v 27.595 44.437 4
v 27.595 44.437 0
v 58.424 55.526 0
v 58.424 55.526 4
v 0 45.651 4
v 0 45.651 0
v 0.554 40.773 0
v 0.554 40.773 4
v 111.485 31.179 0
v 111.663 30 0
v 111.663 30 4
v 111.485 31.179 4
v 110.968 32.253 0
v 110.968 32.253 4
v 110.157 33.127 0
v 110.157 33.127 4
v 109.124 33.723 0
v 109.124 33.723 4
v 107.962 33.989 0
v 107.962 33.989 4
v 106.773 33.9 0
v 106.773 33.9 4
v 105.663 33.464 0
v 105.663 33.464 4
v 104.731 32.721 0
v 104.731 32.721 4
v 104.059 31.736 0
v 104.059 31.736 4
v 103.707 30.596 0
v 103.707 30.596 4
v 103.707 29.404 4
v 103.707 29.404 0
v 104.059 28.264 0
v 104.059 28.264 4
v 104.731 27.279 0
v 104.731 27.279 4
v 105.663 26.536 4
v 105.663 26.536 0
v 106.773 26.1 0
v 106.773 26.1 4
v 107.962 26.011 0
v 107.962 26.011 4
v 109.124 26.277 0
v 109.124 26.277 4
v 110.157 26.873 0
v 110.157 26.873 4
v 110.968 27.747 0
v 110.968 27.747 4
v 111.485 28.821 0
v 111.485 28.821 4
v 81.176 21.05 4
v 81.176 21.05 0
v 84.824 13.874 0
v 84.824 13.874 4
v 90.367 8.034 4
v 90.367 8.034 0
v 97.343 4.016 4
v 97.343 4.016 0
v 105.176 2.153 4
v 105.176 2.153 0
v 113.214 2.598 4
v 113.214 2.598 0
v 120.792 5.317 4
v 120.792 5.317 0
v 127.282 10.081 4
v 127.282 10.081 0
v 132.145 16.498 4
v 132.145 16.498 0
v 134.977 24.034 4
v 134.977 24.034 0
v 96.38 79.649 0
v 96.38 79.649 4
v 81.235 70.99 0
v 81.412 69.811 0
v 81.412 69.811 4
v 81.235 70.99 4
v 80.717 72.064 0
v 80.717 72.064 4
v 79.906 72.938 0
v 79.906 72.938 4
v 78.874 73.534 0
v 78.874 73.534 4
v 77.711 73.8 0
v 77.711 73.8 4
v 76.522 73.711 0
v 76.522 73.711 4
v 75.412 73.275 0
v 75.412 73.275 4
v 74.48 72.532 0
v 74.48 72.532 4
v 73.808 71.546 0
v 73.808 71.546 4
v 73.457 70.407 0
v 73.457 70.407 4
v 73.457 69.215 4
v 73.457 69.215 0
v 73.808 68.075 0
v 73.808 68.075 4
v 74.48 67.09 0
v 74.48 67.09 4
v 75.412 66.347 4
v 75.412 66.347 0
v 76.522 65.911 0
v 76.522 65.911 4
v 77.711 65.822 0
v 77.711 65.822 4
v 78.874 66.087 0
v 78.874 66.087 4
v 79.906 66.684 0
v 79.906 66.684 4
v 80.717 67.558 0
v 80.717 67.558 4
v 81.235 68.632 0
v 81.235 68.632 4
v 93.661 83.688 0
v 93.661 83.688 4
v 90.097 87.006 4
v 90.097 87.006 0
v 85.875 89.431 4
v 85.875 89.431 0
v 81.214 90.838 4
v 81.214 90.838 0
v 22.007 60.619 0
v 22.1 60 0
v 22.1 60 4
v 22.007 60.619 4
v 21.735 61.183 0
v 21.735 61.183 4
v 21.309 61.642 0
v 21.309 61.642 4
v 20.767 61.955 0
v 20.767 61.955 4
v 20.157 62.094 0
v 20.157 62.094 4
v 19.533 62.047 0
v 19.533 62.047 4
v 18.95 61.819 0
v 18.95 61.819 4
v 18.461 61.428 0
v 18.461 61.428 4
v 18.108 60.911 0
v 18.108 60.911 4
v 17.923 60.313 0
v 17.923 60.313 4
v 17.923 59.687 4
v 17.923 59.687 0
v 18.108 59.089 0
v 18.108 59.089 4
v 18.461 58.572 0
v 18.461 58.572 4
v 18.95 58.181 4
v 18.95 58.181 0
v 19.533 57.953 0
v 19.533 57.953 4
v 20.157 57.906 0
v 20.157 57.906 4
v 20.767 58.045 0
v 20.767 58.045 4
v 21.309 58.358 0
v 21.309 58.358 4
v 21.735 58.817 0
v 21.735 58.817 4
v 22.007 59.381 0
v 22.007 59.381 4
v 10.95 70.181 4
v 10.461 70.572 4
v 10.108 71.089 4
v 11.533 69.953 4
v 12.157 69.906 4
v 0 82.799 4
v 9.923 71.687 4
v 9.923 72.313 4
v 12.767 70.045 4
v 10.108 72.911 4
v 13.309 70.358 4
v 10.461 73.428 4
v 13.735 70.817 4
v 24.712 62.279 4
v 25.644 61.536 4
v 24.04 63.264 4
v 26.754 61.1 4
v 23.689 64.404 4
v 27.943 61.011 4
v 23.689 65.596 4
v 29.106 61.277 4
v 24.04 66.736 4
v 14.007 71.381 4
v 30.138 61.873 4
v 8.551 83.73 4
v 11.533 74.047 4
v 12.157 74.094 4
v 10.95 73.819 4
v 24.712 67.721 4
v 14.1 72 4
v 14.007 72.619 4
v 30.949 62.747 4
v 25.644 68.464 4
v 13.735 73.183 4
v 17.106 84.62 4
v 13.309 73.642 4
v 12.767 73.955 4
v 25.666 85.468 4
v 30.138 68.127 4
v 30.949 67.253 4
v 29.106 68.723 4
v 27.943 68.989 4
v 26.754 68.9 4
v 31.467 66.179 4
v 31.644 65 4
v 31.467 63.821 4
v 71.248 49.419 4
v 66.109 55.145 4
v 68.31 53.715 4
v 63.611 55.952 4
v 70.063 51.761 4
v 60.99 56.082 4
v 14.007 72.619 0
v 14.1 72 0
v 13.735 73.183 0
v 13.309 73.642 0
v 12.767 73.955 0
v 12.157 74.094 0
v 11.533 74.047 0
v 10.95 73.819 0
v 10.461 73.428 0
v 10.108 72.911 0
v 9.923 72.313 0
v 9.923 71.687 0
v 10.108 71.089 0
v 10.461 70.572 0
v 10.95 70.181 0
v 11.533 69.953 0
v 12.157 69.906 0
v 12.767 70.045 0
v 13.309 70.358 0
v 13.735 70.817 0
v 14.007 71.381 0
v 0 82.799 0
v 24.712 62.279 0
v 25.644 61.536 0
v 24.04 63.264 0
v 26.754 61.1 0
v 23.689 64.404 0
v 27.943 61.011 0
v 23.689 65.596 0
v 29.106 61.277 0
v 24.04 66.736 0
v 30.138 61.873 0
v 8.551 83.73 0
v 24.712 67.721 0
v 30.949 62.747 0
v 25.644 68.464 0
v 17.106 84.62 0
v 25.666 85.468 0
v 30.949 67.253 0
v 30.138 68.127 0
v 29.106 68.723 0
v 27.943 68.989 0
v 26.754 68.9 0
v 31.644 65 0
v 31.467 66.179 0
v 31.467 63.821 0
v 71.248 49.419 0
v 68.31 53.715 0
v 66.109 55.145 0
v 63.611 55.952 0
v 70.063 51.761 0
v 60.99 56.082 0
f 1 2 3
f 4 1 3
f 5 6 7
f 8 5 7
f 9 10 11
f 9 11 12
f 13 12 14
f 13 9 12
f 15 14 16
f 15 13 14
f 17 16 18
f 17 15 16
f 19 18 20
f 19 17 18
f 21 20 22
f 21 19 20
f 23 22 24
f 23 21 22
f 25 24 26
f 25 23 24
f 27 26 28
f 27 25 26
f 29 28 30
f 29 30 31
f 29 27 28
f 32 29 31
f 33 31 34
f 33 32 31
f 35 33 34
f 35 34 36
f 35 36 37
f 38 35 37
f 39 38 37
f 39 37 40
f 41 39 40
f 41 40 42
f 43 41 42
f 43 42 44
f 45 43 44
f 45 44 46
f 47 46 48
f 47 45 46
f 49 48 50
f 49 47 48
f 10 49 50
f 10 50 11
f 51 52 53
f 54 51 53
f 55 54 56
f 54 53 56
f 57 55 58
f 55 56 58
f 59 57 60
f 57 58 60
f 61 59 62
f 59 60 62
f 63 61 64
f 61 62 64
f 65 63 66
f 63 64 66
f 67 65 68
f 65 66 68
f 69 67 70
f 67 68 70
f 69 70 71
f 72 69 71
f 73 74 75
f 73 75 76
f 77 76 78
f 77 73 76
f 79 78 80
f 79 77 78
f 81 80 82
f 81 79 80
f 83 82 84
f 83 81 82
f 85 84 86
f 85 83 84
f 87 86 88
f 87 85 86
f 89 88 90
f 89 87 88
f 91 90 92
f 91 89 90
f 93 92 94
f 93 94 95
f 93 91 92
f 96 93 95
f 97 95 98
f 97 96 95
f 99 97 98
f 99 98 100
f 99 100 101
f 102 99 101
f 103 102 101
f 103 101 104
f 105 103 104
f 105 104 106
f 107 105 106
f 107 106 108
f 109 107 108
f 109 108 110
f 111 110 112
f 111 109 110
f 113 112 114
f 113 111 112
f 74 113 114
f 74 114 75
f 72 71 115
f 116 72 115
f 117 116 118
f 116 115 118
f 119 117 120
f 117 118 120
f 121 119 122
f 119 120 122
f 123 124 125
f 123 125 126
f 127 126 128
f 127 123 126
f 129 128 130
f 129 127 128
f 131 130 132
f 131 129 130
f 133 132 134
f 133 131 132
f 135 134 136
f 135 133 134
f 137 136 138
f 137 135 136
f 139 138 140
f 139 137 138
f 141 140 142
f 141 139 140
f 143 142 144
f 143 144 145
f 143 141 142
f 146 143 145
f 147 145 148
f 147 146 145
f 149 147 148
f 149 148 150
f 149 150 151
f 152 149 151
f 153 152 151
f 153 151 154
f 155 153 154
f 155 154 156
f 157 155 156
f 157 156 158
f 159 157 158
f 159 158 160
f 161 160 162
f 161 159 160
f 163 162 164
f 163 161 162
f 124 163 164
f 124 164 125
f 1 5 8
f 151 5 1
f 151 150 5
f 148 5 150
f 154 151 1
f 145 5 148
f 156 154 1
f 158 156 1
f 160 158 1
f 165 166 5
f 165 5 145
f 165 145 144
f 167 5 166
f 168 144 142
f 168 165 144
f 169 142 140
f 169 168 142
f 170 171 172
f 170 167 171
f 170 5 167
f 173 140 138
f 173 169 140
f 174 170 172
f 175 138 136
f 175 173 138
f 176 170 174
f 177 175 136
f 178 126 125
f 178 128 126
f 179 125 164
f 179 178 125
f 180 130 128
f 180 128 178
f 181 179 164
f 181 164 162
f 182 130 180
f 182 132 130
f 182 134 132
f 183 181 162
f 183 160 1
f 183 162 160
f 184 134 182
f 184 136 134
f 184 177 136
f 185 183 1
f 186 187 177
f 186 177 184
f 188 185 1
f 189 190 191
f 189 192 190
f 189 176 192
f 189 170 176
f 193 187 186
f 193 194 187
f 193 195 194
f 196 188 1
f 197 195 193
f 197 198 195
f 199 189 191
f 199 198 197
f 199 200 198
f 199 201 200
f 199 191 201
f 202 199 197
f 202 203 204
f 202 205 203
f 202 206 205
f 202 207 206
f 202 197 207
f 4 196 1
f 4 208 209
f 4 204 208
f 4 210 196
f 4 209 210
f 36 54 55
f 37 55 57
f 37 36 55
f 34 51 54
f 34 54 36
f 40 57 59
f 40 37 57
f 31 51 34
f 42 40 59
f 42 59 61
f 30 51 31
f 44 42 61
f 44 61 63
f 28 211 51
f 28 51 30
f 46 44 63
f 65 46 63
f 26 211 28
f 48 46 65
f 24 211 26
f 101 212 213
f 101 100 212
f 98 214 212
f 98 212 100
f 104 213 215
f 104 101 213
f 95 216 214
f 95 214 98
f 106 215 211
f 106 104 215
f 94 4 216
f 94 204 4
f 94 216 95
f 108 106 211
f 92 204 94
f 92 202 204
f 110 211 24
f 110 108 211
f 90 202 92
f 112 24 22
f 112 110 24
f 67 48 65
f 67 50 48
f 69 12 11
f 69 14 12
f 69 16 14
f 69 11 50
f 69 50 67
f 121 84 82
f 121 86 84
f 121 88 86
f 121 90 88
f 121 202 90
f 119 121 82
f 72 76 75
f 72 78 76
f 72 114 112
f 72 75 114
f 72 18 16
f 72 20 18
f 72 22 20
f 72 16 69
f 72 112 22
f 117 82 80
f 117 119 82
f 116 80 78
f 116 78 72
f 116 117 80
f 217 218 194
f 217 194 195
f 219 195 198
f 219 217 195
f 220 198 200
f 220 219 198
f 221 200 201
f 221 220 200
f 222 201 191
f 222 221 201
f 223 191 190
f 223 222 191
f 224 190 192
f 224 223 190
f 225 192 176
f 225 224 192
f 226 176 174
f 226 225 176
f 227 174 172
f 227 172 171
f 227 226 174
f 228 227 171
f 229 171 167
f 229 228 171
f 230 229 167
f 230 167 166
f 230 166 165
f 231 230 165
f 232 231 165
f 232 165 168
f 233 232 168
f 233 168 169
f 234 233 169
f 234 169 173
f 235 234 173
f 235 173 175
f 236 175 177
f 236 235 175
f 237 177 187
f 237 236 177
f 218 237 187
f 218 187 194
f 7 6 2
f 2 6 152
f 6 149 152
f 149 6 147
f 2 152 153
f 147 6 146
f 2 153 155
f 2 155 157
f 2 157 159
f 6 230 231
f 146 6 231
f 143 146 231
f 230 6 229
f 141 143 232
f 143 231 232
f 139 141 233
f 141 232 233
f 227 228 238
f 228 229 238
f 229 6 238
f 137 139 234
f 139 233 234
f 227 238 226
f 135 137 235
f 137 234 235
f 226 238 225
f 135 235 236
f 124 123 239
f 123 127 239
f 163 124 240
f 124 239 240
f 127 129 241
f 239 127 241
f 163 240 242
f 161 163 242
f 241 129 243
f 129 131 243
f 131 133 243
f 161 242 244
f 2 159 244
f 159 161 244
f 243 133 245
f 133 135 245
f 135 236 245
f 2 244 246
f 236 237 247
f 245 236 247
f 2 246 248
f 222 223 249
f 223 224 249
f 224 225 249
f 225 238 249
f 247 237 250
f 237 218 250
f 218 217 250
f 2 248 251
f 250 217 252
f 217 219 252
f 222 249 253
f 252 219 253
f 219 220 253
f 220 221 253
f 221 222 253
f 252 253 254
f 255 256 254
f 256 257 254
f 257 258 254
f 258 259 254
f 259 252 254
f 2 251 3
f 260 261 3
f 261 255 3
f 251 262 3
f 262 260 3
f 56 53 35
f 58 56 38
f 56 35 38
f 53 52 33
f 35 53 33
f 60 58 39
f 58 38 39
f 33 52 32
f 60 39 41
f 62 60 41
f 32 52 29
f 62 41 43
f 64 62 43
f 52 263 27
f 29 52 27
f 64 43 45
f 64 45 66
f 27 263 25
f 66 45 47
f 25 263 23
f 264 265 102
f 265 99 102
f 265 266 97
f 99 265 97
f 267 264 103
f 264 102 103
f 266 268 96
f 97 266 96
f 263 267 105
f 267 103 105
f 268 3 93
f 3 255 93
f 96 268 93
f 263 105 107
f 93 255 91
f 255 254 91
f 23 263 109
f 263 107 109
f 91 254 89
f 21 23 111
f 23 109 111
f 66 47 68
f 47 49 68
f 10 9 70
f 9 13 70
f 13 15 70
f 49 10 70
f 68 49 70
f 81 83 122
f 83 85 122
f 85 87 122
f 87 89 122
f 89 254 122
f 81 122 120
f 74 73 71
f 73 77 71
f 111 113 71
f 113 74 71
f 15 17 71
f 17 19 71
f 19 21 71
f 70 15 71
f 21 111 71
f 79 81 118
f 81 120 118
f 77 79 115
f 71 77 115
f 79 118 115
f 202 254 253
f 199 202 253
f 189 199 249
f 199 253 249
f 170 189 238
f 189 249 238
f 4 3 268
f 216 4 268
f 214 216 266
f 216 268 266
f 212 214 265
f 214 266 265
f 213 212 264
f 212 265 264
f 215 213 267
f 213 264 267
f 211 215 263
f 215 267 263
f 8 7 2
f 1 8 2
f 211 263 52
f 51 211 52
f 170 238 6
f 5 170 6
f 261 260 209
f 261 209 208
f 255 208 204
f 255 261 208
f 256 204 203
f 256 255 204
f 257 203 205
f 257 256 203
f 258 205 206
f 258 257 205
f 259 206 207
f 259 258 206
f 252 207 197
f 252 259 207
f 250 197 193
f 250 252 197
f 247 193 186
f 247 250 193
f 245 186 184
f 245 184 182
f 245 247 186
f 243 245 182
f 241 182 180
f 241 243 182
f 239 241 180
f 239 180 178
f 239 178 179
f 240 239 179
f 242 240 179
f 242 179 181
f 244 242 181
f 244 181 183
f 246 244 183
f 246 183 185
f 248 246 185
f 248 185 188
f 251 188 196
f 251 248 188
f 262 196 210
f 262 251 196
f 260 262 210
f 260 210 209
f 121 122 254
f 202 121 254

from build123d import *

# Parameters (mm, degrees)
SKETCH_1_R      = 4
SKETCH_1_R_2    = 2.1
EXTRUDE_1_DEPTH = 4


with BuildPart() as part:
    # 草图1 → 凸台-拉伸1 (new body)
    with BuildSketch(Plane.XY):
        with BuildLine():
            Line((27.595444366, 44.436718371), (58.424396384, 55.525816351))
            ThreePointArc((58.424396384, 55.525816351), (66.108542504, 55.144576239), (71.247769486, 49.419212353))
            Line((71.247769486, 49.419212353), (81.175756204, 21.050380059))
            ThreePointArc((81.175756204, 21.050380059), (109.210938469, 2.084714208), (134.977054883, 24.034091663))
            Line((134.977054883, 24.034091663), (96.380255963, 79.649048221))
            ThreePointArc((96.380255963, 79.649048221), (90.097204959, 87.005823858), (81.213704463, 90.837572367))
            Line((81.213704463, 90.837572367), (25.665757334, 85.467931148))
            ThreePointArc((25.665757334, 85.467931148), (12.828050908, 84.180051983), (0, 82.799309813))
            Line((0, 82.799309813), (0, 45.6506733))
            Line((0, 45.6506733), (0.554484915, 40.773047428))
            Line((0.554484915, 40.773047428), (27.595444366, 44.436718371))
        make_face()
        with Locations((27.644326344, 65)):
            Circle(SKETCH_1_R, mode=Mode.SUBTRACT)
        with Locations((107.662812973, 30)):
            Circle(SKETCH_1_R, mode=Mode.SUBTRACT)
        with Locations((77.412339268, 69.810913587)):
            Circle(SKETCH_1_R, mode=Mode.SUBTRACT)
        with Locations((20, 60)):
            Circle(SKETCH_1_R_2, mode=Mode.SUBTRACT)
        with Locations((12, 72)):
            Circle(SKETCH_1_R_2, mode=Mode.SUBTRACT)
    extrude(amount=EXTRUDE_1_DEPTH)


solid = part.part
